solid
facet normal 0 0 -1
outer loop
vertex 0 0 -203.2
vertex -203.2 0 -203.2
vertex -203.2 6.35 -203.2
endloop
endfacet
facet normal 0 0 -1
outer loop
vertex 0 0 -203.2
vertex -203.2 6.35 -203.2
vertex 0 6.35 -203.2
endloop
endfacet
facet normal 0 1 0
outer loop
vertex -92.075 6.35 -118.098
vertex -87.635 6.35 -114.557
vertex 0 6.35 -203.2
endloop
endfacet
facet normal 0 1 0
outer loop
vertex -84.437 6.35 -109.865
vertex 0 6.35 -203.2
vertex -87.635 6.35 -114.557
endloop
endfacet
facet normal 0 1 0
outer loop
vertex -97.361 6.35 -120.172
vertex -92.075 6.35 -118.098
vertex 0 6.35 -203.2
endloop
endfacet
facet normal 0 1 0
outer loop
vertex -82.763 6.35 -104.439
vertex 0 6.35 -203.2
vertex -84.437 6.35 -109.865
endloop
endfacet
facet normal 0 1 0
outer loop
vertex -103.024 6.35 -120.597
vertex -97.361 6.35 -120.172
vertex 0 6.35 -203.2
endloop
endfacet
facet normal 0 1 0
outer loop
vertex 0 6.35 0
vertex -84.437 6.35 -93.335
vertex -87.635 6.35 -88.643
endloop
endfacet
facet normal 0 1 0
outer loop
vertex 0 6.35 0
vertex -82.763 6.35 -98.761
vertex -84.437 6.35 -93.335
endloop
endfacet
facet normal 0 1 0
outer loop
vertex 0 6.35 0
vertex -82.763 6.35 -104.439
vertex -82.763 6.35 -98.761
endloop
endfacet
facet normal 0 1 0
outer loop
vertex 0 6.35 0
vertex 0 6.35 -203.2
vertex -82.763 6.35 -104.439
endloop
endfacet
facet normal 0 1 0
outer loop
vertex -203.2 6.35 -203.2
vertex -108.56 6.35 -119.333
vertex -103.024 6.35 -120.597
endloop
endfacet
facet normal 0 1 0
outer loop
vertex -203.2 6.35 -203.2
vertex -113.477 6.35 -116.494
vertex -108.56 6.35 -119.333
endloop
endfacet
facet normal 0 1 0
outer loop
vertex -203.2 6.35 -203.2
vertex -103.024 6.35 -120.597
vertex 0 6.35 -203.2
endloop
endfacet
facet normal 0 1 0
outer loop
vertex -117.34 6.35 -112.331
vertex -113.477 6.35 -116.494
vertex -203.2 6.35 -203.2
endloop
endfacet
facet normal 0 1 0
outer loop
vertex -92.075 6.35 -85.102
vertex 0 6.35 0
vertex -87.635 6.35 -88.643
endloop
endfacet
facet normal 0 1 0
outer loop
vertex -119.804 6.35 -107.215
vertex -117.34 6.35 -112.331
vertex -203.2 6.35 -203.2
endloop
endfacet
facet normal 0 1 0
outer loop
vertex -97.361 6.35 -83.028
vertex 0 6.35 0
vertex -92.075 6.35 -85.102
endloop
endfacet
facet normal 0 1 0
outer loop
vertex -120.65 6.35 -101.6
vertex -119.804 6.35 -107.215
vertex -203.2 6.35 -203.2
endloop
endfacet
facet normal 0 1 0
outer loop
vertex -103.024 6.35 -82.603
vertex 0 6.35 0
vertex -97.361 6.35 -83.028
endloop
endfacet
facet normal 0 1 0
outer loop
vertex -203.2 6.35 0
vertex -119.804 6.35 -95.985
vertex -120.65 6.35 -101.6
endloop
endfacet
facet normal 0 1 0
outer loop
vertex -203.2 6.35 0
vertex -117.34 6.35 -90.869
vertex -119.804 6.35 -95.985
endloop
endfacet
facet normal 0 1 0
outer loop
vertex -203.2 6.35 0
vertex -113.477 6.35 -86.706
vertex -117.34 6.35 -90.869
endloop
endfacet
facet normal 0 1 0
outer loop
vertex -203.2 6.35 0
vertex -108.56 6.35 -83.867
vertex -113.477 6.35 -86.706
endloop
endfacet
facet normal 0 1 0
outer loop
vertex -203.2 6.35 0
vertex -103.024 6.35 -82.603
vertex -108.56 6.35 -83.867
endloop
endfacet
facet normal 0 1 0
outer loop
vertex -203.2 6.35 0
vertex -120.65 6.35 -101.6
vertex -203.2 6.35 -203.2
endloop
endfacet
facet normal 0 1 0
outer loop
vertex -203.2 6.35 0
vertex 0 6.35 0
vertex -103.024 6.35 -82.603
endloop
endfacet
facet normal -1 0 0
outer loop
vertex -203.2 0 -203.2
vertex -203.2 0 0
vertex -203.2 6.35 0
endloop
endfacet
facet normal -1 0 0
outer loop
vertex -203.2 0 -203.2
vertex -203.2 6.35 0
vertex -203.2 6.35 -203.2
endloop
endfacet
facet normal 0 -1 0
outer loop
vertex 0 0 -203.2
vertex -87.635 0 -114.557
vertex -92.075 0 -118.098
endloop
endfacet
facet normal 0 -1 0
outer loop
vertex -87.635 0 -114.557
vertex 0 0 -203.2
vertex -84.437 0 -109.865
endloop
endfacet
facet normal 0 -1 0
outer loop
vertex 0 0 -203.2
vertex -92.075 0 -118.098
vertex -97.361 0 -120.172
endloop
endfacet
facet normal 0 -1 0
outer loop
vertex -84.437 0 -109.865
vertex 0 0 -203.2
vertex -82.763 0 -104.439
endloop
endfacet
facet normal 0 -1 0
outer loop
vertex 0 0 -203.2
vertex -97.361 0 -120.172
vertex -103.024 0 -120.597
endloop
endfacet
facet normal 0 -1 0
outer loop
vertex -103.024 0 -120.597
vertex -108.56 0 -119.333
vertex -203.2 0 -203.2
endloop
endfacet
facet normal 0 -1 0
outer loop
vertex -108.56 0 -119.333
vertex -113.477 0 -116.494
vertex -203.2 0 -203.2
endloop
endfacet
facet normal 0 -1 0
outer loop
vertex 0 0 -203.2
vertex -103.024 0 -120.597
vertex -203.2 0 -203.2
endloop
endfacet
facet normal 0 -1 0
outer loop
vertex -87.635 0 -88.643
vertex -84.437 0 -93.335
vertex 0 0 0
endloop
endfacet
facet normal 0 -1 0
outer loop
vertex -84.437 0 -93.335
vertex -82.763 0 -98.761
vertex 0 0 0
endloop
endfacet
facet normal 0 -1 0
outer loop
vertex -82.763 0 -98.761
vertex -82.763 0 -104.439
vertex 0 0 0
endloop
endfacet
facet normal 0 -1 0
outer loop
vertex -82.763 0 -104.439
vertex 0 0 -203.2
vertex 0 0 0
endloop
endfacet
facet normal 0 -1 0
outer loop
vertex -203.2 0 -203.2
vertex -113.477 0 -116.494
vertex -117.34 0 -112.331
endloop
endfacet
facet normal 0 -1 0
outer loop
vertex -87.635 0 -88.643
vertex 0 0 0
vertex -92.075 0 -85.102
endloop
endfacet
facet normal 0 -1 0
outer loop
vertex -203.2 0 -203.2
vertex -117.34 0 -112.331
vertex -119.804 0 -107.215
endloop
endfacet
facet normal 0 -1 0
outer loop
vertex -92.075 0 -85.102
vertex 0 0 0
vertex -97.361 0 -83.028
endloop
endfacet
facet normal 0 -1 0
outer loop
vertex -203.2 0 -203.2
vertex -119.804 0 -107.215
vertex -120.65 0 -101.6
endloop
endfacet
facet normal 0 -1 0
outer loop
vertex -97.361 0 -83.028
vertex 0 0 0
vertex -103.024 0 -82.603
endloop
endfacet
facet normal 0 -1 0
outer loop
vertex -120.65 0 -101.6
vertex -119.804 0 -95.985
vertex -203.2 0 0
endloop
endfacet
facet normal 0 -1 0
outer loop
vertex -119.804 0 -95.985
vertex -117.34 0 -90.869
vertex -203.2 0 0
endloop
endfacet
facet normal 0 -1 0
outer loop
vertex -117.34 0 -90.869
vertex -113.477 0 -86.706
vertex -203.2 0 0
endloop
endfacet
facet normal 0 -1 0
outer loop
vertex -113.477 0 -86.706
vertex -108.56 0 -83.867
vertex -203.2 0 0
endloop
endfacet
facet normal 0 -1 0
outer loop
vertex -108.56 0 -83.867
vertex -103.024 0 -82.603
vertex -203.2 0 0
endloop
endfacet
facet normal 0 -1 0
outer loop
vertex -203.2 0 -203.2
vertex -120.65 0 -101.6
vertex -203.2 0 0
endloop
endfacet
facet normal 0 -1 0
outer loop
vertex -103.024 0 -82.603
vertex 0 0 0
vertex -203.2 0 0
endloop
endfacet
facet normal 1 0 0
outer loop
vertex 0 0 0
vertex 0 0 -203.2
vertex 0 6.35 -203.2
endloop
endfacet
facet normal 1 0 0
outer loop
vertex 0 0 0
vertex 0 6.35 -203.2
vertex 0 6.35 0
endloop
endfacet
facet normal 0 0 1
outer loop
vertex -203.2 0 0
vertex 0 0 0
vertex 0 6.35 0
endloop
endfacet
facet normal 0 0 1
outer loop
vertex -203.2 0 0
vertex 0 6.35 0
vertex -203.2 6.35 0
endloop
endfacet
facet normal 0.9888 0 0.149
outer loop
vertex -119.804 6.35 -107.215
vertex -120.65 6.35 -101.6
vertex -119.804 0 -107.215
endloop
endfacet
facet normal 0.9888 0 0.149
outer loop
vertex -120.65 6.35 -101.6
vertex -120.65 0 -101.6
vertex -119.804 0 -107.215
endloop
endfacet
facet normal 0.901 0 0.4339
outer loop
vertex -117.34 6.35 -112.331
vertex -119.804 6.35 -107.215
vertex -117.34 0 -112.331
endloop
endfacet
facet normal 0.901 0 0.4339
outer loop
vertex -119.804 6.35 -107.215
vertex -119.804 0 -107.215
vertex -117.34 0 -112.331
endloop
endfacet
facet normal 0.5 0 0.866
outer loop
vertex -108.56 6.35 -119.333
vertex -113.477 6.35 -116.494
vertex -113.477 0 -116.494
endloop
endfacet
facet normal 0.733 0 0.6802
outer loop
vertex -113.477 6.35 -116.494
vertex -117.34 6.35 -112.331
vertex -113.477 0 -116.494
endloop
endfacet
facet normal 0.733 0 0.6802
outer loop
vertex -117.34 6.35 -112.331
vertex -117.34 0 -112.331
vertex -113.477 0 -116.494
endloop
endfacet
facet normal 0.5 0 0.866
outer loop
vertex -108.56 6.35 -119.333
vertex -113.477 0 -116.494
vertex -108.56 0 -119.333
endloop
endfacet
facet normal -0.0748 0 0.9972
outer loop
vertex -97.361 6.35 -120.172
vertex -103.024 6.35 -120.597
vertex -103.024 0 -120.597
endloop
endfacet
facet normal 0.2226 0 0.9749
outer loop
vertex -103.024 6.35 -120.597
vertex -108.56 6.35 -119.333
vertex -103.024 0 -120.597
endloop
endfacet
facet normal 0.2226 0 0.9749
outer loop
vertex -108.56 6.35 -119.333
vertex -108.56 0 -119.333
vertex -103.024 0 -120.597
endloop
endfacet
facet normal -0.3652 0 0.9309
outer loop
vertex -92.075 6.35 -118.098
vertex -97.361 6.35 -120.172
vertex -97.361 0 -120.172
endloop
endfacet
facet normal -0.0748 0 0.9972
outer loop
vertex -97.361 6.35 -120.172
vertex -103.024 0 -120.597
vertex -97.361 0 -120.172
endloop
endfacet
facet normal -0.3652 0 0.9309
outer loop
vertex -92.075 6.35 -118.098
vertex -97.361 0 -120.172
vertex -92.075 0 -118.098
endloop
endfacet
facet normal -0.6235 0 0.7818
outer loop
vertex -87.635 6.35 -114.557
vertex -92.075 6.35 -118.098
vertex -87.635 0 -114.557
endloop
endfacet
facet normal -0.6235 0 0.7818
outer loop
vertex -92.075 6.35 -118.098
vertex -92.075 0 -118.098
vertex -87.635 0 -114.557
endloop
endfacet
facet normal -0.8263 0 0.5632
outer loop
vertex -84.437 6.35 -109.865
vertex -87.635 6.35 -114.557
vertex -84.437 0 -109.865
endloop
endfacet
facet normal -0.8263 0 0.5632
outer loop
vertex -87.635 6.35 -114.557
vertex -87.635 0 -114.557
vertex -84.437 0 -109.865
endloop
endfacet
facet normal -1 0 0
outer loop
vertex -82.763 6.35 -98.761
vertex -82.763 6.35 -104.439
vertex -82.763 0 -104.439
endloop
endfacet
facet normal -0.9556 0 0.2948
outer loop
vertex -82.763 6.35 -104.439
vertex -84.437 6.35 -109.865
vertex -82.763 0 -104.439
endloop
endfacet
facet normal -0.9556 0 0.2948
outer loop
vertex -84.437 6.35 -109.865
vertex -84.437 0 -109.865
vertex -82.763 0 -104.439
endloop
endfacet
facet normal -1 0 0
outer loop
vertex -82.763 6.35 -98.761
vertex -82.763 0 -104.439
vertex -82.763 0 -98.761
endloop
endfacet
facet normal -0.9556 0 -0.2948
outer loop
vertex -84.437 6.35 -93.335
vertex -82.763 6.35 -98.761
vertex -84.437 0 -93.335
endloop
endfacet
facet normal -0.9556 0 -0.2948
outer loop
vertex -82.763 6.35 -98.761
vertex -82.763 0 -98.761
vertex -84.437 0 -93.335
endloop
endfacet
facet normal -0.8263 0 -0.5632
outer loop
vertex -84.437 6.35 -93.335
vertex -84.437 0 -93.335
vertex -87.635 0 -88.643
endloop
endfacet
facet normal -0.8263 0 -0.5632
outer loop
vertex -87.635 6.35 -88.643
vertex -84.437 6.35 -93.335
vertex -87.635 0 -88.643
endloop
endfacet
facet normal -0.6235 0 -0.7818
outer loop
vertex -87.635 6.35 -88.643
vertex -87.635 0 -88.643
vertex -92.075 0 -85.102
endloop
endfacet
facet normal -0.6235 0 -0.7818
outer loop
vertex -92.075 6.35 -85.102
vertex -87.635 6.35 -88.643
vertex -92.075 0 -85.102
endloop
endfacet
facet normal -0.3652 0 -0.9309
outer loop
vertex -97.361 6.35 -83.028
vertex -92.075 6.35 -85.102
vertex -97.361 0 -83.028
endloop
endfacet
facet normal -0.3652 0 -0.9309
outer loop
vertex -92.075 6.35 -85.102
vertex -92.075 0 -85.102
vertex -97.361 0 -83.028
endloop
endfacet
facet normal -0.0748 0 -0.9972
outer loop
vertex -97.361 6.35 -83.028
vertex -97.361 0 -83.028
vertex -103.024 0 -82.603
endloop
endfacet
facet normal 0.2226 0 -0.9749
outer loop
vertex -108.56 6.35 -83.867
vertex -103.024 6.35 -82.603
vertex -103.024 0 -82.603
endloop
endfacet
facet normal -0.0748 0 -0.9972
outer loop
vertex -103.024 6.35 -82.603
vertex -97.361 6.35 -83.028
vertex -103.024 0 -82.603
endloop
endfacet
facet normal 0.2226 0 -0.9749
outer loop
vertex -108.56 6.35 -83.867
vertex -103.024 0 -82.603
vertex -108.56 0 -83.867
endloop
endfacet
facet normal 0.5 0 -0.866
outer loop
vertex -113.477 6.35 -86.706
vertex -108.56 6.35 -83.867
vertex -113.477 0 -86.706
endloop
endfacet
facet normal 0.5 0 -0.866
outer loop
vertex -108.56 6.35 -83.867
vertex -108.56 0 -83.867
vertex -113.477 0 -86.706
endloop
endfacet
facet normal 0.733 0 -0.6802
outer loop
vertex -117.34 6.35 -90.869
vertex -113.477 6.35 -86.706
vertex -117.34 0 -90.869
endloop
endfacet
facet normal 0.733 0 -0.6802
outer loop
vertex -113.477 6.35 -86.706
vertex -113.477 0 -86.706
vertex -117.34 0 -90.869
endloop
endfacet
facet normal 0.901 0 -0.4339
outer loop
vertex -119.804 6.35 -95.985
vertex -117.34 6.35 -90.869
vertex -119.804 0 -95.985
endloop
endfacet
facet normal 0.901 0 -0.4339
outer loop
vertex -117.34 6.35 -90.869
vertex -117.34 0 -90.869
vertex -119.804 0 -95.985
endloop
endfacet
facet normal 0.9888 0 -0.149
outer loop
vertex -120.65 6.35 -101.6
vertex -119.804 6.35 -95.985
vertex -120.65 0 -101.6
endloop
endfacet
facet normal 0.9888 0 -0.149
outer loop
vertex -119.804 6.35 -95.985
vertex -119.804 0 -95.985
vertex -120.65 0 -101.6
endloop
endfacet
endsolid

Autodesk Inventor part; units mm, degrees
ref_plane "YZ Plane" through (0, 0, 0) normal (1, 0, 0) x (0, 1, 0)
ref_plane "XZ Plane" through (0, 0, 0) normal (0, 1, 0) x (-1, 0, 0)
ref_plane "XY Plane" through (0, 0, 0) normal (0, 0, 1) x (1, 0, 0)
sketch "Sketch1" plane through (0, 0, 0) normal (0, 1, 0) x (-1, 0, 0)
  line L0 (0, 0) -> (203.2, 0)
  line L1 (203.2, 0) -> (203.2, -203.2)
  line L2 (203.2, -203.2) -> (0, -203.2)
  line L3 (0, -203.2) -> (0, 0)
  circle A0 centre (101.6, -101.6) radius 19.05
  dimension "d0" = 203.2
  dimension "d1" = 203.2
  dimension "d4" = 38.1
  dimension "d5" = 101.6
  dimension "d6" = 101.6
extrude "Extrusion1" add sketch "Sketch1" along normal blind 6.35
properties part number "Plate8inx8in"
